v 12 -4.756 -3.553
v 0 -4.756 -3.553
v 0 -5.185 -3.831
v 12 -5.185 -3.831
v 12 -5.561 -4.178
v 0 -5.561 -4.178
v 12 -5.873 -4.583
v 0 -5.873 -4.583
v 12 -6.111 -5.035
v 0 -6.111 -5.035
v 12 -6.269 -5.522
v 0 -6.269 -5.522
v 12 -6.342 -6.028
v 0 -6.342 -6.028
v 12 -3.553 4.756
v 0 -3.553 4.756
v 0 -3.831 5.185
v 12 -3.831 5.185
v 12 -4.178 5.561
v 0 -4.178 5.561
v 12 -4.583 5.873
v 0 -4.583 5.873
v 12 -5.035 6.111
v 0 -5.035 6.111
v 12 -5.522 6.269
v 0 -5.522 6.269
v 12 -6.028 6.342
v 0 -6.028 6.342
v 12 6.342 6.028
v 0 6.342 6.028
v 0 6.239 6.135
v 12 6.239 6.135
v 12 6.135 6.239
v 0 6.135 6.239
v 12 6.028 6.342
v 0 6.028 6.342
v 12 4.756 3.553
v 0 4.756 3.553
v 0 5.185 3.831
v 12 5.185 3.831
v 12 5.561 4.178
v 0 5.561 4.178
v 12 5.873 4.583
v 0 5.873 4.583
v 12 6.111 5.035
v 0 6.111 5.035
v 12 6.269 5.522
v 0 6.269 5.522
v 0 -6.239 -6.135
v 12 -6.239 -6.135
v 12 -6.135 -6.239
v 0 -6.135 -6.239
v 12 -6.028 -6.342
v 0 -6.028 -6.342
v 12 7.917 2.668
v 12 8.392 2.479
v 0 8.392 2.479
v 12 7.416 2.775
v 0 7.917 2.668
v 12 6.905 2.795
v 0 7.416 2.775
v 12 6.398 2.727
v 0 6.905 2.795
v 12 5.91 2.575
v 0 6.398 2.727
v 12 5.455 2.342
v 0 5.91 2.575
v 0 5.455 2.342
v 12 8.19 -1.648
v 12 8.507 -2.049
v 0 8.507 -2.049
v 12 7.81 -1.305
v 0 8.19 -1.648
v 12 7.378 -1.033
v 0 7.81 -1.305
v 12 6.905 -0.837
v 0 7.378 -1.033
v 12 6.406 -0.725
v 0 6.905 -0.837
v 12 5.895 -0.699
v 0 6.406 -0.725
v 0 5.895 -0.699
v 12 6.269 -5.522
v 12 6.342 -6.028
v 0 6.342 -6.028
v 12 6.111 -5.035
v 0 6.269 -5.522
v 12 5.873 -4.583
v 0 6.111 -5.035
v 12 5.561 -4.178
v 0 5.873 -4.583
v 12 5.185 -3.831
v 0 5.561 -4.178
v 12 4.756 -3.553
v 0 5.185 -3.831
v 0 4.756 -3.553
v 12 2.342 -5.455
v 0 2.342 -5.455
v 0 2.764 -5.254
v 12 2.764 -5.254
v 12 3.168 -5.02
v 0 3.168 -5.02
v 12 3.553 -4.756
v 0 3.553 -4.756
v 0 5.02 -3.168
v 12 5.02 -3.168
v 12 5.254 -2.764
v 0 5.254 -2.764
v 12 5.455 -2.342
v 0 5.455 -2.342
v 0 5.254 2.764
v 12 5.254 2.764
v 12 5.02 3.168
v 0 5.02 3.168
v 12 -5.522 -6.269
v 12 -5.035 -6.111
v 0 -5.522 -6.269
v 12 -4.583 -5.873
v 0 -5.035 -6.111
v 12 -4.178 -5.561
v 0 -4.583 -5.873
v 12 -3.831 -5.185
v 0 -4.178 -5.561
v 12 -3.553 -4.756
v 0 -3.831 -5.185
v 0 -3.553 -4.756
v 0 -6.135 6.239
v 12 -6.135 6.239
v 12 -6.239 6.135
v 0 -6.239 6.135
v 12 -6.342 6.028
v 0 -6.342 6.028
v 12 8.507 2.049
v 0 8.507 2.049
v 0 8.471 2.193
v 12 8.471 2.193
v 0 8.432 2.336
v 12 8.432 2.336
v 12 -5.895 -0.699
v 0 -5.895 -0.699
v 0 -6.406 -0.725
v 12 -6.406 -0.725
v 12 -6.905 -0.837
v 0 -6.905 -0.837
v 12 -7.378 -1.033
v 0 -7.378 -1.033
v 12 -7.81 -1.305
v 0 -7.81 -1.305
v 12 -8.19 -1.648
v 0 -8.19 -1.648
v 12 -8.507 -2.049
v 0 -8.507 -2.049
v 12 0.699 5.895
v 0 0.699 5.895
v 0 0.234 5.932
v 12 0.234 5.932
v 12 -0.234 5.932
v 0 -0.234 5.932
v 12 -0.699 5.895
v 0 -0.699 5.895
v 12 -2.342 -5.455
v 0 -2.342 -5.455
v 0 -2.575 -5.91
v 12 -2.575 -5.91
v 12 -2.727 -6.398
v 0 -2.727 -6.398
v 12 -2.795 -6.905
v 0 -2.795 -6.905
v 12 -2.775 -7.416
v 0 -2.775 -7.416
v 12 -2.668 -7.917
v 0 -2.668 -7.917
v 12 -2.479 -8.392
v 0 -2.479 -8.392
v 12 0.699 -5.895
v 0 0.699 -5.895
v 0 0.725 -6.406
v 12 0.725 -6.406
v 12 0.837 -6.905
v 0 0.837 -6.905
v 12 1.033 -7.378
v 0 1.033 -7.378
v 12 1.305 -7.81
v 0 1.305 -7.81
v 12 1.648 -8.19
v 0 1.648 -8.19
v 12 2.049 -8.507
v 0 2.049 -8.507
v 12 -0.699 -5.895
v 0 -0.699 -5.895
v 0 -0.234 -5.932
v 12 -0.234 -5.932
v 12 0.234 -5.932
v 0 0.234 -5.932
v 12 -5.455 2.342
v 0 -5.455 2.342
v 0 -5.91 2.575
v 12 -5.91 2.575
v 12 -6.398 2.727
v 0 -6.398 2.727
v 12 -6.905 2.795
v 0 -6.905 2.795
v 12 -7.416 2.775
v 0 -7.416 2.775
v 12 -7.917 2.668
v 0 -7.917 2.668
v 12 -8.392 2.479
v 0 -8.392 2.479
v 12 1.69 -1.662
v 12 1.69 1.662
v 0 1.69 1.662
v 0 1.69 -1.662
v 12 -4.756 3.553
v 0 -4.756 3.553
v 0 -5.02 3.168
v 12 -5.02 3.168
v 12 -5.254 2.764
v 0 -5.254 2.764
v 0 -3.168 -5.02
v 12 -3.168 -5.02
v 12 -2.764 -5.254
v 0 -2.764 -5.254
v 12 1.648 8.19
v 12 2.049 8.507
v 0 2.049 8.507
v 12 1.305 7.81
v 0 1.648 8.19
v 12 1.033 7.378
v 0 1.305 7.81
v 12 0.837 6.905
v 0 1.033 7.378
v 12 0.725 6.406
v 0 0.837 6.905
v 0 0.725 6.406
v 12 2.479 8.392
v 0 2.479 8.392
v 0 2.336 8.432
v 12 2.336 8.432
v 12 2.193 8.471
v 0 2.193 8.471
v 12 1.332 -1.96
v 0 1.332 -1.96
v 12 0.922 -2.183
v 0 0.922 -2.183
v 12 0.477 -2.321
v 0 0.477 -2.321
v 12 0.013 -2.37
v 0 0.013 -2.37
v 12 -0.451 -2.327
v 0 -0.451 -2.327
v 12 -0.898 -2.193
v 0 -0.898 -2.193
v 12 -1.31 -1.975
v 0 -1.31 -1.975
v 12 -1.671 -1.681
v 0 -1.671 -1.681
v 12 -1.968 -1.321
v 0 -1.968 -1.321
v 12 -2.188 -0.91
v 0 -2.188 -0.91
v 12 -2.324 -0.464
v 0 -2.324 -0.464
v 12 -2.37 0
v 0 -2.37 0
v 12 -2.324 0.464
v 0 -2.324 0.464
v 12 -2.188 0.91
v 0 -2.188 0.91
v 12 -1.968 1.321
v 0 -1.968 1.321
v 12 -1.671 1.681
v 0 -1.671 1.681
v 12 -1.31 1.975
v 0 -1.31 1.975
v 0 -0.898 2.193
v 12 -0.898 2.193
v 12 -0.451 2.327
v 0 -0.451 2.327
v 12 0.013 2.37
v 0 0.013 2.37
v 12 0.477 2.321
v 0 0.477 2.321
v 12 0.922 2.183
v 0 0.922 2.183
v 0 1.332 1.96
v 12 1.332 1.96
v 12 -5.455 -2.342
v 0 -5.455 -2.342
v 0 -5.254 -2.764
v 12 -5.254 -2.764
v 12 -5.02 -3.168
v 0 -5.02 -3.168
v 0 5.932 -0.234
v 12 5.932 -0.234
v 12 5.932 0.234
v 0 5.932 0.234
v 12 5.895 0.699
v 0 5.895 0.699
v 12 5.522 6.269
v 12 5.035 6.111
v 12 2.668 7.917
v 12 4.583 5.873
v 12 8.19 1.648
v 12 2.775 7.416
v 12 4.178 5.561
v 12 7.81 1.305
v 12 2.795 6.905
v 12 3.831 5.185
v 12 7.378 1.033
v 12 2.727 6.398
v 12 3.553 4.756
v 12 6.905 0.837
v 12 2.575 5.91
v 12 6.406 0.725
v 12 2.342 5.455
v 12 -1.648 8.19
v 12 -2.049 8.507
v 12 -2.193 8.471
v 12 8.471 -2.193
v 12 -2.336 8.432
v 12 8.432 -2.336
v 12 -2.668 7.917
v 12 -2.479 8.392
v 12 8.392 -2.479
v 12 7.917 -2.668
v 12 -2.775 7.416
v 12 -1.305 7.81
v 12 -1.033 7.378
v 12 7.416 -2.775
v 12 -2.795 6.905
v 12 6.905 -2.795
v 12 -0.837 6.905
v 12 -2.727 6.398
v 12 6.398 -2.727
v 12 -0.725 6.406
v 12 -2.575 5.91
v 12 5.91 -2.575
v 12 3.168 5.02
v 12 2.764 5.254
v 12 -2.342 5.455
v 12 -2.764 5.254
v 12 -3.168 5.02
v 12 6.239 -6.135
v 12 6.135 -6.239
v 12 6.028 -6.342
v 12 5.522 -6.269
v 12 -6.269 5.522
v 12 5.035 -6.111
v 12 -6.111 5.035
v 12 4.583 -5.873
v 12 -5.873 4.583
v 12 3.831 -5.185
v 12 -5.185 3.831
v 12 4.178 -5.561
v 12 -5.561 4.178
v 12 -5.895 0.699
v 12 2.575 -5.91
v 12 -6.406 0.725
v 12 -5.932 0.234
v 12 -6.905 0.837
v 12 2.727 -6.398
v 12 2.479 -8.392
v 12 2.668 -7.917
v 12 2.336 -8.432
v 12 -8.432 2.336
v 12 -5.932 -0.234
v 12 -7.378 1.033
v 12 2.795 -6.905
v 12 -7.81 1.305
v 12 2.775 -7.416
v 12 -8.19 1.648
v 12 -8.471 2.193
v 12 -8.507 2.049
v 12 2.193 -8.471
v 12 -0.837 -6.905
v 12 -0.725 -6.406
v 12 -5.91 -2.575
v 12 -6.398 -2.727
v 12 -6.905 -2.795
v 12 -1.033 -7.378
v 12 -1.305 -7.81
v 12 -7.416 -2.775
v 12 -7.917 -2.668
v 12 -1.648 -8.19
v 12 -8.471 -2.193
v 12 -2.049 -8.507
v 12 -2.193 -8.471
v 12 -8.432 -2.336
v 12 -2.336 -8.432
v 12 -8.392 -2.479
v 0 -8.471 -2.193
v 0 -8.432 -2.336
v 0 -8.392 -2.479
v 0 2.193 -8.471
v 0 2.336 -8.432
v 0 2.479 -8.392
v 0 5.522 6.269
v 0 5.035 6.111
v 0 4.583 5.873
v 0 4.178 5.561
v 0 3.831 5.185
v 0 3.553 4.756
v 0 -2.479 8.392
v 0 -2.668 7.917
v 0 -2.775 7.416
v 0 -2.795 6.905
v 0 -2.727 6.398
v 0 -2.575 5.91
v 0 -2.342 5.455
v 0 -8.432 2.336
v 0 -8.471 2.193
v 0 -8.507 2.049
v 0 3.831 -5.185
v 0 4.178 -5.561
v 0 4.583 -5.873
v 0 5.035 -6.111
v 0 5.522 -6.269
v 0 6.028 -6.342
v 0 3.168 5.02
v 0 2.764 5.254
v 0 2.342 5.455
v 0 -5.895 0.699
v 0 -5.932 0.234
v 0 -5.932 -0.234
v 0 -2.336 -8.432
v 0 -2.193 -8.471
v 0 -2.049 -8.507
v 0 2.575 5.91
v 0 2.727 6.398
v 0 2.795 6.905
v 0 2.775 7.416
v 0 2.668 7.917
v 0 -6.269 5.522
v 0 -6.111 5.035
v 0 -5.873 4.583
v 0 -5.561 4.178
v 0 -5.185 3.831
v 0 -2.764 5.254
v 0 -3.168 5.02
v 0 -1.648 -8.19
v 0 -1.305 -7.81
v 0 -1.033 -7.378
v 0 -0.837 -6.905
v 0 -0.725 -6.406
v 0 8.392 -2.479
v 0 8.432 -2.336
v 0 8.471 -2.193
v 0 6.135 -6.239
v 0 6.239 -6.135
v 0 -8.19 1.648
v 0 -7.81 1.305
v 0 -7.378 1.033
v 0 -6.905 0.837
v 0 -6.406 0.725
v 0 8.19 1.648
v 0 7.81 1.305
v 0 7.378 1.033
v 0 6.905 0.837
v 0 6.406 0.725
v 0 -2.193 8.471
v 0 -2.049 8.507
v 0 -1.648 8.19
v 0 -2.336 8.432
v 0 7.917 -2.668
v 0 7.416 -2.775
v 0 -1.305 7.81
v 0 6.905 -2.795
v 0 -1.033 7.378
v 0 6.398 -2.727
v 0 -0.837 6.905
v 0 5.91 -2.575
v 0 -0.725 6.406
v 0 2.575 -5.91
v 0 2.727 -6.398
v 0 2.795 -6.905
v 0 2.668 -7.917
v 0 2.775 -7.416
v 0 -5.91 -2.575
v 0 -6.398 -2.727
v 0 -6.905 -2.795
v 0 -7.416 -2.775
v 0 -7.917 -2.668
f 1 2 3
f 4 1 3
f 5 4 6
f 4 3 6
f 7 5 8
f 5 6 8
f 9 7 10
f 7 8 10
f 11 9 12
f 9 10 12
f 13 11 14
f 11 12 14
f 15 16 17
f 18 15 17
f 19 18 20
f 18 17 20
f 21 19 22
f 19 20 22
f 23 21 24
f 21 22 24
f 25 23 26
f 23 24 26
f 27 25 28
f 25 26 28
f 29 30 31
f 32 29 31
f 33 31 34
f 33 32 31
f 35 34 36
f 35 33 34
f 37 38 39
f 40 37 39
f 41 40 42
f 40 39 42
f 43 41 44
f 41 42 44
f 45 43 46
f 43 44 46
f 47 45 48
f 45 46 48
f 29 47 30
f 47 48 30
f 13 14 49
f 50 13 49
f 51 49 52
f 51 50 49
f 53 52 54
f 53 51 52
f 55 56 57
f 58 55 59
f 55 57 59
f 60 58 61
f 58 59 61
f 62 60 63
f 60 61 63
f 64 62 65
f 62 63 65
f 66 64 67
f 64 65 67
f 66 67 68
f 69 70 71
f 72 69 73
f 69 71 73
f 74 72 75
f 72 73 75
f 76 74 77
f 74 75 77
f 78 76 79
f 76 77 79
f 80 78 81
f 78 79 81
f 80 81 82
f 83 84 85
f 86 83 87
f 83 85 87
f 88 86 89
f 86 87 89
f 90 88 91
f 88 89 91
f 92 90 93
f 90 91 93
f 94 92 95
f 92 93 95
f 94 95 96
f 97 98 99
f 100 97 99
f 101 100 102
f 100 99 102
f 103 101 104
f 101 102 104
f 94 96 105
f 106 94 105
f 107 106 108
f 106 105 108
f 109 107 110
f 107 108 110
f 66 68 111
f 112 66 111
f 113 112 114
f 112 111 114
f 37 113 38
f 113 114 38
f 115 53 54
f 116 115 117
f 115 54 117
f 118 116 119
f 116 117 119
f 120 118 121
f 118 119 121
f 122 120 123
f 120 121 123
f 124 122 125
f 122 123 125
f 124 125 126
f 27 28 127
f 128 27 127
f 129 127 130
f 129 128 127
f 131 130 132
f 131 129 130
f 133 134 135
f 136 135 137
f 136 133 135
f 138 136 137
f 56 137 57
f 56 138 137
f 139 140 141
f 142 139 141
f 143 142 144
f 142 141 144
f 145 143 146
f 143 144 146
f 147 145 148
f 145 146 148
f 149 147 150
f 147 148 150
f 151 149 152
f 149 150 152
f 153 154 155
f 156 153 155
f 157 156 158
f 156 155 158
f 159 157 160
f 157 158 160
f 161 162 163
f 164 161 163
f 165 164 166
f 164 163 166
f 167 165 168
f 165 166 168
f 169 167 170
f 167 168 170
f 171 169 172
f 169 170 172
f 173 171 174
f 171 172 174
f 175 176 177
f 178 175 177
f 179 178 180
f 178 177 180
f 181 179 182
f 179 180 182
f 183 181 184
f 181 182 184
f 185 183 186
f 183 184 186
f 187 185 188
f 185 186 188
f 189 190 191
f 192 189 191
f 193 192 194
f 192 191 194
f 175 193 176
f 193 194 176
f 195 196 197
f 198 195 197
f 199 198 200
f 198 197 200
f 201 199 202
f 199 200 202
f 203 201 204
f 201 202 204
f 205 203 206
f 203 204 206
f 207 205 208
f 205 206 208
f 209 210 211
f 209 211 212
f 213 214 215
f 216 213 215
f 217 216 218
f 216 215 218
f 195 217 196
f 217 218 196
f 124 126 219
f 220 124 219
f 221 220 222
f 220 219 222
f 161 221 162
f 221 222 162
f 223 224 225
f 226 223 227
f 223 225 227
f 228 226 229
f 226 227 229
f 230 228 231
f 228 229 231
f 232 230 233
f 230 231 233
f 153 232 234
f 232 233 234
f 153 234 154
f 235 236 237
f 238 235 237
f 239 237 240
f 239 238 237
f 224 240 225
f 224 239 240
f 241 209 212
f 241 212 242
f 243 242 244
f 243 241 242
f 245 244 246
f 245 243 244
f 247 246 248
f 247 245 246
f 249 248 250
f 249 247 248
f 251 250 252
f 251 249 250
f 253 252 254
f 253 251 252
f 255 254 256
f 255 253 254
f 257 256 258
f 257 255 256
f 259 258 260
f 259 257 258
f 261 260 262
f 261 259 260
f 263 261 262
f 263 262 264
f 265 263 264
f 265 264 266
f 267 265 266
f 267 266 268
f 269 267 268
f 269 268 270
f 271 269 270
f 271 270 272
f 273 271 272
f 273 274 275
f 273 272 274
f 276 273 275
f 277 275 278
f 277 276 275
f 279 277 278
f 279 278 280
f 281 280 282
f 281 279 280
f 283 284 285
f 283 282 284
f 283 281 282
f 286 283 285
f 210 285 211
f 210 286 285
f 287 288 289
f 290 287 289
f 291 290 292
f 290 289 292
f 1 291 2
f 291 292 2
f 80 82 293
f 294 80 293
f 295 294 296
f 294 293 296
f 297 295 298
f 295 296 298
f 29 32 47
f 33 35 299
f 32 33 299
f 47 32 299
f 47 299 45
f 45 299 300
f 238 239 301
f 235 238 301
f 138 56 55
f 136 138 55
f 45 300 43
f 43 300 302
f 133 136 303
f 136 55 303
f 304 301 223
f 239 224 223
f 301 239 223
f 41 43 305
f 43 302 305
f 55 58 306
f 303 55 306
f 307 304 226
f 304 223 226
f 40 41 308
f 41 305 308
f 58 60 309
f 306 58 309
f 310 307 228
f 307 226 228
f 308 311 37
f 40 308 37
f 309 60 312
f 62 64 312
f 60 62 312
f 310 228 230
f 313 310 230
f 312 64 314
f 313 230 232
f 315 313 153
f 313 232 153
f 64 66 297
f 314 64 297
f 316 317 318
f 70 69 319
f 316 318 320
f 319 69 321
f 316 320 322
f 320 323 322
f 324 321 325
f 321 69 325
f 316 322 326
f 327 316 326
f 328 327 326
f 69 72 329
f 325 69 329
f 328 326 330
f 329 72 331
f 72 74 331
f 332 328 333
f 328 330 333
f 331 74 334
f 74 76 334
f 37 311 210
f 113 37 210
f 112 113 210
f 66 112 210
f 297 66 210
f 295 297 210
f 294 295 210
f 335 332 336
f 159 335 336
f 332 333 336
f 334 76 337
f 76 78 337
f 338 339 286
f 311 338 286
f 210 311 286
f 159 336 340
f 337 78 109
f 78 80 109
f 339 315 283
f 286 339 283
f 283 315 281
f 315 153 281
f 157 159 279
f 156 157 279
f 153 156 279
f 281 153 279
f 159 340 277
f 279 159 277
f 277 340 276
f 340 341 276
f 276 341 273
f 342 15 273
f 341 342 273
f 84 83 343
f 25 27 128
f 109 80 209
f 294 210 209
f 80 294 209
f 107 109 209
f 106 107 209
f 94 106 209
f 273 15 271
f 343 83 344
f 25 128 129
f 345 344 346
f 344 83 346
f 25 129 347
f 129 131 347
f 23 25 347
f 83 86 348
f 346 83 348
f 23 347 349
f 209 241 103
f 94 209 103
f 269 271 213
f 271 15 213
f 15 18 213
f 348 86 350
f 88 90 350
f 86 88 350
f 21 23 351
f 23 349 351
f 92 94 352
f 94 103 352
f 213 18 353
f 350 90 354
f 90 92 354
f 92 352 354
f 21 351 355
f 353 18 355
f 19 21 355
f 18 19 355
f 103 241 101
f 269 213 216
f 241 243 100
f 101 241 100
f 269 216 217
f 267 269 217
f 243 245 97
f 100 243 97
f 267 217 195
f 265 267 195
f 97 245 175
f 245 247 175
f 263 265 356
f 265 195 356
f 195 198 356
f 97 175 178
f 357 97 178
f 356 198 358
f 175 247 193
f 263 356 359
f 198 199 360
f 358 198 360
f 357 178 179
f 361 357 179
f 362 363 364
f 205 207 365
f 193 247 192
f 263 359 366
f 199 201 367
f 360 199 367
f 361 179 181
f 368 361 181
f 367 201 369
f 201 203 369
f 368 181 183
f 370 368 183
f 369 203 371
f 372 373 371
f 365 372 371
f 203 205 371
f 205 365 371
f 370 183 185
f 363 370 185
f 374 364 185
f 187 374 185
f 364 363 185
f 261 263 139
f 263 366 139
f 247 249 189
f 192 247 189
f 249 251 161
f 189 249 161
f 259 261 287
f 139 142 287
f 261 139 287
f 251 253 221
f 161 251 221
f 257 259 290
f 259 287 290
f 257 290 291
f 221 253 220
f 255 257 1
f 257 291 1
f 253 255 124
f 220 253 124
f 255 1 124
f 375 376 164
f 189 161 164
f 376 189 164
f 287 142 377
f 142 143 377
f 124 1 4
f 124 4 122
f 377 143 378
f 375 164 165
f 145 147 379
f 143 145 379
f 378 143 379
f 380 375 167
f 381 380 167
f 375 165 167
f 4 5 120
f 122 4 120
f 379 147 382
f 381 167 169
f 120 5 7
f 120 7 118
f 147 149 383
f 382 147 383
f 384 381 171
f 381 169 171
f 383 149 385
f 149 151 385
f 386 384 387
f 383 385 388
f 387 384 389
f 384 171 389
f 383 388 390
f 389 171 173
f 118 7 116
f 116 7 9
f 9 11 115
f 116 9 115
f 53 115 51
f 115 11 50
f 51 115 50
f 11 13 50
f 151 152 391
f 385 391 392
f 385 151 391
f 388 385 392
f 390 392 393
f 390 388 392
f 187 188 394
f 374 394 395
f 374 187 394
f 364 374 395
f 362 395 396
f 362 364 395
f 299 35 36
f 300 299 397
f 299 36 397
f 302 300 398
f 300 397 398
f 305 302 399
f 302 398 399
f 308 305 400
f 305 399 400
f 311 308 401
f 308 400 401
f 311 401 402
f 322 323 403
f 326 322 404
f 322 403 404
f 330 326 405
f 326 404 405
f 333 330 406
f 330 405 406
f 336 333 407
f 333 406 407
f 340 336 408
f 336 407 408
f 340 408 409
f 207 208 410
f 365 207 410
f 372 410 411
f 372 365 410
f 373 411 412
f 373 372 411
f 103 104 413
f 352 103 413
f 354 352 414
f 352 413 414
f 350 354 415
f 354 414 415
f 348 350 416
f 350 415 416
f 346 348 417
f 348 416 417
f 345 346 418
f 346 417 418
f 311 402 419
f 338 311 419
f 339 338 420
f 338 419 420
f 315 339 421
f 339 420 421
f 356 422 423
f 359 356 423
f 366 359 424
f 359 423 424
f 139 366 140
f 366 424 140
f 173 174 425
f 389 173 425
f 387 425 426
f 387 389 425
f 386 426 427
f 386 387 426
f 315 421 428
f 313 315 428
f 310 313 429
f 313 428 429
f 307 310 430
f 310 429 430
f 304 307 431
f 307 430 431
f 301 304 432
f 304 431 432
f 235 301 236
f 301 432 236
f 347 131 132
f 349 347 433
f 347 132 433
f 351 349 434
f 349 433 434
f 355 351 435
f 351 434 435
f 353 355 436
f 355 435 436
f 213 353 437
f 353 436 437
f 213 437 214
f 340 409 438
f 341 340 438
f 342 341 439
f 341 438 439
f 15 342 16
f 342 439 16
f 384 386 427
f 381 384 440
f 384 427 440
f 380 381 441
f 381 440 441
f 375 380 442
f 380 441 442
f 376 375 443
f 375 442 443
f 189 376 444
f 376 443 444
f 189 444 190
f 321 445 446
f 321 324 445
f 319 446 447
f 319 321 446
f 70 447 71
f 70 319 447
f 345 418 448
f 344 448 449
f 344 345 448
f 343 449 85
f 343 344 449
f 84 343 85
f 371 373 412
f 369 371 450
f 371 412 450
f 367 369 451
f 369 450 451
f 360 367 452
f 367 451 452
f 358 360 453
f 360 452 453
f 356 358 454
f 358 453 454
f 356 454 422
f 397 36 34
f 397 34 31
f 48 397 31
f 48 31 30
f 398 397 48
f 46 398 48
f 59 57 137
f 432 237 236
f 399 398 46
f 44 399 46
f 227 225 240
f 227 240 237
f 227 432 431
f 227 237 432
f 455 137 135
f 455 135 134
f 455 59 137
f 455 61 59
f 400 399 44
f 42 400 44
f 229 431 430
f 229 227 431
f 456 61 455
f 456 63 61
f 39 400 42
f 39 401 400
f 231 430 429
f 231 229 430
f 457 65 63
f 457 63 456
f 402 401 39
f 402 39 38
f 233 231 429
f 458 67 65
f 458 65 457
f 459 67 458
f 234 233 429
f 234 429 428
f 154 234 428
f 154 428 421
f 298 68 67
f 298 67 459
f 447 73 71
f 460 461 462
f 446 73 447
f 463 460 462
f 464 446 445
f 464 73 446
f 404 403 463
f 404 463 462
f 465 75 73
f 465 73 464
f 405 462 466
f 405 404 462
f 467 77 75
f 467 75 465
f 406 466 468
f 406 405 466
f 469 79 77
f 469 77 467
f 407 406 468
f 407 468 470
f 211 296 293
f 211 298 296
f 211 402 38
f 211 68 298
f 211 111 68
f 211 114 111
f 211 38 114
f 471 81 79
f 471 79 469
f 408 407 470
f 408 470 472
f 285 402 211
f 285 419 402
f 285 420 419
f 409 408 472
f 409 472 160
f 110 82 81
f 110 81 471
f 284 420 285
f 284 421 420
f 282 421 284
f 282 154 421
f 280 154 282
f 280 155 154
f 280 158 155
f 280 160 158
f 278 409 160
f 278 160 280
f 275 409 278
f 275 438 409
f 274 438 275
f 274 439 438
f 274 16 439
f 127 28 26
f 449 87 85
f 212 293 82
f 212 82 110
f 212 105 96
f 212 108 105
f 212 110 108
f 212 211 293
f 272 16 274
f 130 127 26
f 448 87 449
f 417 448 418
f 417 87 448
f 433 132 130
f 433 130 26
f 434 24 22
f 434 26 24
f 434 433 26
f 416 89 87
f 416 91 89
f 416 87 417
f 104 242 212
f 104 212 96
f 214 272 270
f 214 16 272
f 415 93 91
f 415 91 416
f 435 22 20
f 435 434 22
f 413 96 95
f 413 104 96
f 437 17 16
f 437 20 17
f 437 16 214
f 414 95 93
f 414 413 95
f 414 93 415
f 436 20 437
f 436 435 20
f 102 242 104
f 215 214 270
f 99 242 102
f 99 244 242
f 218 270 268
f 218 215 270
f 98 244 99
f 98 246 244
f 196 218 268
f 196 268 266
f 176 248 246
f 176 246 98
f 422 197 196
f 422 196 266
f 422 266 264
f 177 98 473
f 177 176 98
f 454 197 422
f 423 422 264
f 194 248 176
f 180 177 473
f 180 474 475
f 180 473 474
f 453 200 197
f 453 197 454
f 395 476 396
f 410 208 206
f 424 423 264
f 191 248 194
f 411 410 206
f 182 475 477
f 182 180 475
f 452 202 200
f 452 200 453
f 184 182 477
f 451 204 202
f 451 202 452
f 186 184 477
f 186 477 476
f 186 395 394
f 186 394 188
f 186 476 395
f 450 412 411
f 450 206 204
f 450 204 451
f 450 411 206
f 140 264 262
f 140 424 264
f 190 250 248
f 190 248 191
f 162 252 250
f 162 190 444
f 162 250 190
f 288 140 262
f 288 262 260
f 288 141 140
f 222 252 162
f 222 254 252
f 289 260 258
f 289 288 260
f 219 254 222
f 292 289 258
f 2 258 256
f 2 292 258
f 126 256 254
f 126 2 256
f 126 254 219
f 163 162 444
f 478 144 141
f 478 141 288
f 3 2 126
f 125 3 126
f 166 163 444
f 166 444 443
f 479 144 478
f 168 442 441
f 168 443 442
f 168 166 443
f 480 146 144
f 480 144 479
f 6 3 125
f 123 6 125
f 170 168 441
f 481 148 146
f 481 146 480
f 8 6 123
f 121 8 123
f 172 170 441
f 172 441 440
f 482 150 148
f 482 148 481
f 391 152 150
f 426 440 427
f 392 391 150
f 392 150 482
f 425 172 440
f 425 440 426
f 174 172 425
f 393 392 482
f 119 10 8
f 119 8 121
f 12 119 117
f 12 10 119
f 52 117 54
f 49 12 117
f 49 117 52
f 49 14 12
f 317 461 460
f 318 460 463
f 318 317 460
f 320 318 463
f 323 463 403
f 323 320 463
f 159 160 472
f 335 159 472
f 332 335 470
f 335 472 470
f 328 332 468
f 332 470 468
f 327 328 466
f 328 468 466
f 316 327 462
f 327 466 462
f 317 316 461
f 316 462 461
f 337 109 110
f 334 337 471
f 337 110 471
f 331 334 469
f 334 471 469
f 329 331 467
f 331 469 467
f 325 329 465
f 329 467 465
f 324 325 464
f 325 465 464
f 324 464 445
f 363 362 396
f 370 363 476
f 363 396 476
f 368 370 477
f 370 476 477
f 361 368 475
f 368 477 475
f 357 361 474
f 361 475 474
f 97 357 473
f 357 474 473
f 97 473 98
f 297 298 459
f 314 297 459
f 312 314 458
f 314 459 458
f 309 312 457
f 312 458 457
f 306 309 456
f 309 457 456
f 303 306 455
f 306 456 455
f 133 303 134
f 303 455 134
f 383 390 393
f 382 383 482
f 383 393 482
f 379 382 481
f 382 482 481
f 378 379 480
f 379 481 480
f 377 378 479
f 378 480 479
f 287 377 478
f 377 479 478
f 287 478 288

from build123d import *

# Parameters (mm, degrees)
BASPROSKE_W        = 12
BASPROSKE_H        = 8.75
TOOTHCUT_DEPTH     = 18.237314176
TEETHCUTS_COUNT    = 12
TEETHCUTS_ANGLE    = 330
BORSKE_R           = 0.4
BORE_DEPTH         = 50.0000508
CUT_EXTRUDE1_DEPTH = 17.991923373


with BuildPart() as part:
    # BasProSke → Base-Revolve (revolve)
    with BuildSketch(Plane(origin=(0, 0, 0), x_dir=(1, 0, 0), z_dir=(0, 1, 0)), mode=Mode.PRIVATE) as base_revolve_sk:
        with Locations((6, 4.375)):
            Rectangle(BASPROSKE_W, BASPROSKE_H)
    revolve(base_revolve_sk.sketch.rotate(Axis((-10, 0, 0), (1, 0, 0)), 180), axis=Axis((-10, 0, 0), (1, 0, 0)))

    # TooCutSke → ToothCut (cut, through all)
    with BuildSketch(Plane(origin=(0, 0, 0), x_dir=(0, 0, -1), z_dir=(1, 0, 0))):
        with BuildLine():
            ThreePointArc((0.699286786, 5.895170077), (0, 5.9365), (-0.699286786, 5.895170077))
            ThreePointArc((-0.699286786, 5.895170077), (-1.040581249, 7.393099844), (-2.078649209, 8.525659073))
            ThreePointArc((-2.078649209, 8.525659073), (0, 8.7754), (2.078649209, 8.525659073))
            ThreePointArc((2.078649209, 8.525659073), (1.040581249, 7.393099844), (0.699286786, 5.895170077))
        make_face()
    toothcut = extrude(amount=TOOTHCUT_DEPTH, mode=Mode.SUBTRACT)

    # TeethCuts: ToothCut ×12 about axis
    teethcuts_axis = Axis((-10, 0, 0), (1, 0, 0))
    for i in range(1, TEETHCUTS_COUNT):
        add(toothcut.rotate(teethcuts_axis, i * TEETHCUTS_ANGLE / (TEETHCUTS_COUNT - 1)), mode=Mode.SUBTRACT)

    # BorSke → Bore (cut, symmetric)
    with BuildSketch(Plane(origin=(0, 0, 0), x_dir=(0, 0, -1), z_dir=(1, 0, 0))):
        with Locations(Location((0, 0, 0), (0, 0, 180))):
            Circle(BORSKE_R)
    extrude(amount=BORE_DEPTH, both=True, mode=Mode.SUBTRACT)

    # Sketch1 → Cut-Extrude1 (cut, through all)
    with BuildSketch(Plane(origin=(12, 0, 0), x_dir=(0, 0, -1), z_dir=(1, 0, 0))):
        with BuildLine():
            Line((-1.661565527, 1.69), (1.661565527, 1.69))
            ThreePointArc((1.661565527, 1.69), (0, -2.37), (-1.661565527, 1.69))
        make_face()
    extrude(amount=-CUT_EXTRUDE1_DEPTH, mode=Mode.SUBTRACT)


solid = part.part
